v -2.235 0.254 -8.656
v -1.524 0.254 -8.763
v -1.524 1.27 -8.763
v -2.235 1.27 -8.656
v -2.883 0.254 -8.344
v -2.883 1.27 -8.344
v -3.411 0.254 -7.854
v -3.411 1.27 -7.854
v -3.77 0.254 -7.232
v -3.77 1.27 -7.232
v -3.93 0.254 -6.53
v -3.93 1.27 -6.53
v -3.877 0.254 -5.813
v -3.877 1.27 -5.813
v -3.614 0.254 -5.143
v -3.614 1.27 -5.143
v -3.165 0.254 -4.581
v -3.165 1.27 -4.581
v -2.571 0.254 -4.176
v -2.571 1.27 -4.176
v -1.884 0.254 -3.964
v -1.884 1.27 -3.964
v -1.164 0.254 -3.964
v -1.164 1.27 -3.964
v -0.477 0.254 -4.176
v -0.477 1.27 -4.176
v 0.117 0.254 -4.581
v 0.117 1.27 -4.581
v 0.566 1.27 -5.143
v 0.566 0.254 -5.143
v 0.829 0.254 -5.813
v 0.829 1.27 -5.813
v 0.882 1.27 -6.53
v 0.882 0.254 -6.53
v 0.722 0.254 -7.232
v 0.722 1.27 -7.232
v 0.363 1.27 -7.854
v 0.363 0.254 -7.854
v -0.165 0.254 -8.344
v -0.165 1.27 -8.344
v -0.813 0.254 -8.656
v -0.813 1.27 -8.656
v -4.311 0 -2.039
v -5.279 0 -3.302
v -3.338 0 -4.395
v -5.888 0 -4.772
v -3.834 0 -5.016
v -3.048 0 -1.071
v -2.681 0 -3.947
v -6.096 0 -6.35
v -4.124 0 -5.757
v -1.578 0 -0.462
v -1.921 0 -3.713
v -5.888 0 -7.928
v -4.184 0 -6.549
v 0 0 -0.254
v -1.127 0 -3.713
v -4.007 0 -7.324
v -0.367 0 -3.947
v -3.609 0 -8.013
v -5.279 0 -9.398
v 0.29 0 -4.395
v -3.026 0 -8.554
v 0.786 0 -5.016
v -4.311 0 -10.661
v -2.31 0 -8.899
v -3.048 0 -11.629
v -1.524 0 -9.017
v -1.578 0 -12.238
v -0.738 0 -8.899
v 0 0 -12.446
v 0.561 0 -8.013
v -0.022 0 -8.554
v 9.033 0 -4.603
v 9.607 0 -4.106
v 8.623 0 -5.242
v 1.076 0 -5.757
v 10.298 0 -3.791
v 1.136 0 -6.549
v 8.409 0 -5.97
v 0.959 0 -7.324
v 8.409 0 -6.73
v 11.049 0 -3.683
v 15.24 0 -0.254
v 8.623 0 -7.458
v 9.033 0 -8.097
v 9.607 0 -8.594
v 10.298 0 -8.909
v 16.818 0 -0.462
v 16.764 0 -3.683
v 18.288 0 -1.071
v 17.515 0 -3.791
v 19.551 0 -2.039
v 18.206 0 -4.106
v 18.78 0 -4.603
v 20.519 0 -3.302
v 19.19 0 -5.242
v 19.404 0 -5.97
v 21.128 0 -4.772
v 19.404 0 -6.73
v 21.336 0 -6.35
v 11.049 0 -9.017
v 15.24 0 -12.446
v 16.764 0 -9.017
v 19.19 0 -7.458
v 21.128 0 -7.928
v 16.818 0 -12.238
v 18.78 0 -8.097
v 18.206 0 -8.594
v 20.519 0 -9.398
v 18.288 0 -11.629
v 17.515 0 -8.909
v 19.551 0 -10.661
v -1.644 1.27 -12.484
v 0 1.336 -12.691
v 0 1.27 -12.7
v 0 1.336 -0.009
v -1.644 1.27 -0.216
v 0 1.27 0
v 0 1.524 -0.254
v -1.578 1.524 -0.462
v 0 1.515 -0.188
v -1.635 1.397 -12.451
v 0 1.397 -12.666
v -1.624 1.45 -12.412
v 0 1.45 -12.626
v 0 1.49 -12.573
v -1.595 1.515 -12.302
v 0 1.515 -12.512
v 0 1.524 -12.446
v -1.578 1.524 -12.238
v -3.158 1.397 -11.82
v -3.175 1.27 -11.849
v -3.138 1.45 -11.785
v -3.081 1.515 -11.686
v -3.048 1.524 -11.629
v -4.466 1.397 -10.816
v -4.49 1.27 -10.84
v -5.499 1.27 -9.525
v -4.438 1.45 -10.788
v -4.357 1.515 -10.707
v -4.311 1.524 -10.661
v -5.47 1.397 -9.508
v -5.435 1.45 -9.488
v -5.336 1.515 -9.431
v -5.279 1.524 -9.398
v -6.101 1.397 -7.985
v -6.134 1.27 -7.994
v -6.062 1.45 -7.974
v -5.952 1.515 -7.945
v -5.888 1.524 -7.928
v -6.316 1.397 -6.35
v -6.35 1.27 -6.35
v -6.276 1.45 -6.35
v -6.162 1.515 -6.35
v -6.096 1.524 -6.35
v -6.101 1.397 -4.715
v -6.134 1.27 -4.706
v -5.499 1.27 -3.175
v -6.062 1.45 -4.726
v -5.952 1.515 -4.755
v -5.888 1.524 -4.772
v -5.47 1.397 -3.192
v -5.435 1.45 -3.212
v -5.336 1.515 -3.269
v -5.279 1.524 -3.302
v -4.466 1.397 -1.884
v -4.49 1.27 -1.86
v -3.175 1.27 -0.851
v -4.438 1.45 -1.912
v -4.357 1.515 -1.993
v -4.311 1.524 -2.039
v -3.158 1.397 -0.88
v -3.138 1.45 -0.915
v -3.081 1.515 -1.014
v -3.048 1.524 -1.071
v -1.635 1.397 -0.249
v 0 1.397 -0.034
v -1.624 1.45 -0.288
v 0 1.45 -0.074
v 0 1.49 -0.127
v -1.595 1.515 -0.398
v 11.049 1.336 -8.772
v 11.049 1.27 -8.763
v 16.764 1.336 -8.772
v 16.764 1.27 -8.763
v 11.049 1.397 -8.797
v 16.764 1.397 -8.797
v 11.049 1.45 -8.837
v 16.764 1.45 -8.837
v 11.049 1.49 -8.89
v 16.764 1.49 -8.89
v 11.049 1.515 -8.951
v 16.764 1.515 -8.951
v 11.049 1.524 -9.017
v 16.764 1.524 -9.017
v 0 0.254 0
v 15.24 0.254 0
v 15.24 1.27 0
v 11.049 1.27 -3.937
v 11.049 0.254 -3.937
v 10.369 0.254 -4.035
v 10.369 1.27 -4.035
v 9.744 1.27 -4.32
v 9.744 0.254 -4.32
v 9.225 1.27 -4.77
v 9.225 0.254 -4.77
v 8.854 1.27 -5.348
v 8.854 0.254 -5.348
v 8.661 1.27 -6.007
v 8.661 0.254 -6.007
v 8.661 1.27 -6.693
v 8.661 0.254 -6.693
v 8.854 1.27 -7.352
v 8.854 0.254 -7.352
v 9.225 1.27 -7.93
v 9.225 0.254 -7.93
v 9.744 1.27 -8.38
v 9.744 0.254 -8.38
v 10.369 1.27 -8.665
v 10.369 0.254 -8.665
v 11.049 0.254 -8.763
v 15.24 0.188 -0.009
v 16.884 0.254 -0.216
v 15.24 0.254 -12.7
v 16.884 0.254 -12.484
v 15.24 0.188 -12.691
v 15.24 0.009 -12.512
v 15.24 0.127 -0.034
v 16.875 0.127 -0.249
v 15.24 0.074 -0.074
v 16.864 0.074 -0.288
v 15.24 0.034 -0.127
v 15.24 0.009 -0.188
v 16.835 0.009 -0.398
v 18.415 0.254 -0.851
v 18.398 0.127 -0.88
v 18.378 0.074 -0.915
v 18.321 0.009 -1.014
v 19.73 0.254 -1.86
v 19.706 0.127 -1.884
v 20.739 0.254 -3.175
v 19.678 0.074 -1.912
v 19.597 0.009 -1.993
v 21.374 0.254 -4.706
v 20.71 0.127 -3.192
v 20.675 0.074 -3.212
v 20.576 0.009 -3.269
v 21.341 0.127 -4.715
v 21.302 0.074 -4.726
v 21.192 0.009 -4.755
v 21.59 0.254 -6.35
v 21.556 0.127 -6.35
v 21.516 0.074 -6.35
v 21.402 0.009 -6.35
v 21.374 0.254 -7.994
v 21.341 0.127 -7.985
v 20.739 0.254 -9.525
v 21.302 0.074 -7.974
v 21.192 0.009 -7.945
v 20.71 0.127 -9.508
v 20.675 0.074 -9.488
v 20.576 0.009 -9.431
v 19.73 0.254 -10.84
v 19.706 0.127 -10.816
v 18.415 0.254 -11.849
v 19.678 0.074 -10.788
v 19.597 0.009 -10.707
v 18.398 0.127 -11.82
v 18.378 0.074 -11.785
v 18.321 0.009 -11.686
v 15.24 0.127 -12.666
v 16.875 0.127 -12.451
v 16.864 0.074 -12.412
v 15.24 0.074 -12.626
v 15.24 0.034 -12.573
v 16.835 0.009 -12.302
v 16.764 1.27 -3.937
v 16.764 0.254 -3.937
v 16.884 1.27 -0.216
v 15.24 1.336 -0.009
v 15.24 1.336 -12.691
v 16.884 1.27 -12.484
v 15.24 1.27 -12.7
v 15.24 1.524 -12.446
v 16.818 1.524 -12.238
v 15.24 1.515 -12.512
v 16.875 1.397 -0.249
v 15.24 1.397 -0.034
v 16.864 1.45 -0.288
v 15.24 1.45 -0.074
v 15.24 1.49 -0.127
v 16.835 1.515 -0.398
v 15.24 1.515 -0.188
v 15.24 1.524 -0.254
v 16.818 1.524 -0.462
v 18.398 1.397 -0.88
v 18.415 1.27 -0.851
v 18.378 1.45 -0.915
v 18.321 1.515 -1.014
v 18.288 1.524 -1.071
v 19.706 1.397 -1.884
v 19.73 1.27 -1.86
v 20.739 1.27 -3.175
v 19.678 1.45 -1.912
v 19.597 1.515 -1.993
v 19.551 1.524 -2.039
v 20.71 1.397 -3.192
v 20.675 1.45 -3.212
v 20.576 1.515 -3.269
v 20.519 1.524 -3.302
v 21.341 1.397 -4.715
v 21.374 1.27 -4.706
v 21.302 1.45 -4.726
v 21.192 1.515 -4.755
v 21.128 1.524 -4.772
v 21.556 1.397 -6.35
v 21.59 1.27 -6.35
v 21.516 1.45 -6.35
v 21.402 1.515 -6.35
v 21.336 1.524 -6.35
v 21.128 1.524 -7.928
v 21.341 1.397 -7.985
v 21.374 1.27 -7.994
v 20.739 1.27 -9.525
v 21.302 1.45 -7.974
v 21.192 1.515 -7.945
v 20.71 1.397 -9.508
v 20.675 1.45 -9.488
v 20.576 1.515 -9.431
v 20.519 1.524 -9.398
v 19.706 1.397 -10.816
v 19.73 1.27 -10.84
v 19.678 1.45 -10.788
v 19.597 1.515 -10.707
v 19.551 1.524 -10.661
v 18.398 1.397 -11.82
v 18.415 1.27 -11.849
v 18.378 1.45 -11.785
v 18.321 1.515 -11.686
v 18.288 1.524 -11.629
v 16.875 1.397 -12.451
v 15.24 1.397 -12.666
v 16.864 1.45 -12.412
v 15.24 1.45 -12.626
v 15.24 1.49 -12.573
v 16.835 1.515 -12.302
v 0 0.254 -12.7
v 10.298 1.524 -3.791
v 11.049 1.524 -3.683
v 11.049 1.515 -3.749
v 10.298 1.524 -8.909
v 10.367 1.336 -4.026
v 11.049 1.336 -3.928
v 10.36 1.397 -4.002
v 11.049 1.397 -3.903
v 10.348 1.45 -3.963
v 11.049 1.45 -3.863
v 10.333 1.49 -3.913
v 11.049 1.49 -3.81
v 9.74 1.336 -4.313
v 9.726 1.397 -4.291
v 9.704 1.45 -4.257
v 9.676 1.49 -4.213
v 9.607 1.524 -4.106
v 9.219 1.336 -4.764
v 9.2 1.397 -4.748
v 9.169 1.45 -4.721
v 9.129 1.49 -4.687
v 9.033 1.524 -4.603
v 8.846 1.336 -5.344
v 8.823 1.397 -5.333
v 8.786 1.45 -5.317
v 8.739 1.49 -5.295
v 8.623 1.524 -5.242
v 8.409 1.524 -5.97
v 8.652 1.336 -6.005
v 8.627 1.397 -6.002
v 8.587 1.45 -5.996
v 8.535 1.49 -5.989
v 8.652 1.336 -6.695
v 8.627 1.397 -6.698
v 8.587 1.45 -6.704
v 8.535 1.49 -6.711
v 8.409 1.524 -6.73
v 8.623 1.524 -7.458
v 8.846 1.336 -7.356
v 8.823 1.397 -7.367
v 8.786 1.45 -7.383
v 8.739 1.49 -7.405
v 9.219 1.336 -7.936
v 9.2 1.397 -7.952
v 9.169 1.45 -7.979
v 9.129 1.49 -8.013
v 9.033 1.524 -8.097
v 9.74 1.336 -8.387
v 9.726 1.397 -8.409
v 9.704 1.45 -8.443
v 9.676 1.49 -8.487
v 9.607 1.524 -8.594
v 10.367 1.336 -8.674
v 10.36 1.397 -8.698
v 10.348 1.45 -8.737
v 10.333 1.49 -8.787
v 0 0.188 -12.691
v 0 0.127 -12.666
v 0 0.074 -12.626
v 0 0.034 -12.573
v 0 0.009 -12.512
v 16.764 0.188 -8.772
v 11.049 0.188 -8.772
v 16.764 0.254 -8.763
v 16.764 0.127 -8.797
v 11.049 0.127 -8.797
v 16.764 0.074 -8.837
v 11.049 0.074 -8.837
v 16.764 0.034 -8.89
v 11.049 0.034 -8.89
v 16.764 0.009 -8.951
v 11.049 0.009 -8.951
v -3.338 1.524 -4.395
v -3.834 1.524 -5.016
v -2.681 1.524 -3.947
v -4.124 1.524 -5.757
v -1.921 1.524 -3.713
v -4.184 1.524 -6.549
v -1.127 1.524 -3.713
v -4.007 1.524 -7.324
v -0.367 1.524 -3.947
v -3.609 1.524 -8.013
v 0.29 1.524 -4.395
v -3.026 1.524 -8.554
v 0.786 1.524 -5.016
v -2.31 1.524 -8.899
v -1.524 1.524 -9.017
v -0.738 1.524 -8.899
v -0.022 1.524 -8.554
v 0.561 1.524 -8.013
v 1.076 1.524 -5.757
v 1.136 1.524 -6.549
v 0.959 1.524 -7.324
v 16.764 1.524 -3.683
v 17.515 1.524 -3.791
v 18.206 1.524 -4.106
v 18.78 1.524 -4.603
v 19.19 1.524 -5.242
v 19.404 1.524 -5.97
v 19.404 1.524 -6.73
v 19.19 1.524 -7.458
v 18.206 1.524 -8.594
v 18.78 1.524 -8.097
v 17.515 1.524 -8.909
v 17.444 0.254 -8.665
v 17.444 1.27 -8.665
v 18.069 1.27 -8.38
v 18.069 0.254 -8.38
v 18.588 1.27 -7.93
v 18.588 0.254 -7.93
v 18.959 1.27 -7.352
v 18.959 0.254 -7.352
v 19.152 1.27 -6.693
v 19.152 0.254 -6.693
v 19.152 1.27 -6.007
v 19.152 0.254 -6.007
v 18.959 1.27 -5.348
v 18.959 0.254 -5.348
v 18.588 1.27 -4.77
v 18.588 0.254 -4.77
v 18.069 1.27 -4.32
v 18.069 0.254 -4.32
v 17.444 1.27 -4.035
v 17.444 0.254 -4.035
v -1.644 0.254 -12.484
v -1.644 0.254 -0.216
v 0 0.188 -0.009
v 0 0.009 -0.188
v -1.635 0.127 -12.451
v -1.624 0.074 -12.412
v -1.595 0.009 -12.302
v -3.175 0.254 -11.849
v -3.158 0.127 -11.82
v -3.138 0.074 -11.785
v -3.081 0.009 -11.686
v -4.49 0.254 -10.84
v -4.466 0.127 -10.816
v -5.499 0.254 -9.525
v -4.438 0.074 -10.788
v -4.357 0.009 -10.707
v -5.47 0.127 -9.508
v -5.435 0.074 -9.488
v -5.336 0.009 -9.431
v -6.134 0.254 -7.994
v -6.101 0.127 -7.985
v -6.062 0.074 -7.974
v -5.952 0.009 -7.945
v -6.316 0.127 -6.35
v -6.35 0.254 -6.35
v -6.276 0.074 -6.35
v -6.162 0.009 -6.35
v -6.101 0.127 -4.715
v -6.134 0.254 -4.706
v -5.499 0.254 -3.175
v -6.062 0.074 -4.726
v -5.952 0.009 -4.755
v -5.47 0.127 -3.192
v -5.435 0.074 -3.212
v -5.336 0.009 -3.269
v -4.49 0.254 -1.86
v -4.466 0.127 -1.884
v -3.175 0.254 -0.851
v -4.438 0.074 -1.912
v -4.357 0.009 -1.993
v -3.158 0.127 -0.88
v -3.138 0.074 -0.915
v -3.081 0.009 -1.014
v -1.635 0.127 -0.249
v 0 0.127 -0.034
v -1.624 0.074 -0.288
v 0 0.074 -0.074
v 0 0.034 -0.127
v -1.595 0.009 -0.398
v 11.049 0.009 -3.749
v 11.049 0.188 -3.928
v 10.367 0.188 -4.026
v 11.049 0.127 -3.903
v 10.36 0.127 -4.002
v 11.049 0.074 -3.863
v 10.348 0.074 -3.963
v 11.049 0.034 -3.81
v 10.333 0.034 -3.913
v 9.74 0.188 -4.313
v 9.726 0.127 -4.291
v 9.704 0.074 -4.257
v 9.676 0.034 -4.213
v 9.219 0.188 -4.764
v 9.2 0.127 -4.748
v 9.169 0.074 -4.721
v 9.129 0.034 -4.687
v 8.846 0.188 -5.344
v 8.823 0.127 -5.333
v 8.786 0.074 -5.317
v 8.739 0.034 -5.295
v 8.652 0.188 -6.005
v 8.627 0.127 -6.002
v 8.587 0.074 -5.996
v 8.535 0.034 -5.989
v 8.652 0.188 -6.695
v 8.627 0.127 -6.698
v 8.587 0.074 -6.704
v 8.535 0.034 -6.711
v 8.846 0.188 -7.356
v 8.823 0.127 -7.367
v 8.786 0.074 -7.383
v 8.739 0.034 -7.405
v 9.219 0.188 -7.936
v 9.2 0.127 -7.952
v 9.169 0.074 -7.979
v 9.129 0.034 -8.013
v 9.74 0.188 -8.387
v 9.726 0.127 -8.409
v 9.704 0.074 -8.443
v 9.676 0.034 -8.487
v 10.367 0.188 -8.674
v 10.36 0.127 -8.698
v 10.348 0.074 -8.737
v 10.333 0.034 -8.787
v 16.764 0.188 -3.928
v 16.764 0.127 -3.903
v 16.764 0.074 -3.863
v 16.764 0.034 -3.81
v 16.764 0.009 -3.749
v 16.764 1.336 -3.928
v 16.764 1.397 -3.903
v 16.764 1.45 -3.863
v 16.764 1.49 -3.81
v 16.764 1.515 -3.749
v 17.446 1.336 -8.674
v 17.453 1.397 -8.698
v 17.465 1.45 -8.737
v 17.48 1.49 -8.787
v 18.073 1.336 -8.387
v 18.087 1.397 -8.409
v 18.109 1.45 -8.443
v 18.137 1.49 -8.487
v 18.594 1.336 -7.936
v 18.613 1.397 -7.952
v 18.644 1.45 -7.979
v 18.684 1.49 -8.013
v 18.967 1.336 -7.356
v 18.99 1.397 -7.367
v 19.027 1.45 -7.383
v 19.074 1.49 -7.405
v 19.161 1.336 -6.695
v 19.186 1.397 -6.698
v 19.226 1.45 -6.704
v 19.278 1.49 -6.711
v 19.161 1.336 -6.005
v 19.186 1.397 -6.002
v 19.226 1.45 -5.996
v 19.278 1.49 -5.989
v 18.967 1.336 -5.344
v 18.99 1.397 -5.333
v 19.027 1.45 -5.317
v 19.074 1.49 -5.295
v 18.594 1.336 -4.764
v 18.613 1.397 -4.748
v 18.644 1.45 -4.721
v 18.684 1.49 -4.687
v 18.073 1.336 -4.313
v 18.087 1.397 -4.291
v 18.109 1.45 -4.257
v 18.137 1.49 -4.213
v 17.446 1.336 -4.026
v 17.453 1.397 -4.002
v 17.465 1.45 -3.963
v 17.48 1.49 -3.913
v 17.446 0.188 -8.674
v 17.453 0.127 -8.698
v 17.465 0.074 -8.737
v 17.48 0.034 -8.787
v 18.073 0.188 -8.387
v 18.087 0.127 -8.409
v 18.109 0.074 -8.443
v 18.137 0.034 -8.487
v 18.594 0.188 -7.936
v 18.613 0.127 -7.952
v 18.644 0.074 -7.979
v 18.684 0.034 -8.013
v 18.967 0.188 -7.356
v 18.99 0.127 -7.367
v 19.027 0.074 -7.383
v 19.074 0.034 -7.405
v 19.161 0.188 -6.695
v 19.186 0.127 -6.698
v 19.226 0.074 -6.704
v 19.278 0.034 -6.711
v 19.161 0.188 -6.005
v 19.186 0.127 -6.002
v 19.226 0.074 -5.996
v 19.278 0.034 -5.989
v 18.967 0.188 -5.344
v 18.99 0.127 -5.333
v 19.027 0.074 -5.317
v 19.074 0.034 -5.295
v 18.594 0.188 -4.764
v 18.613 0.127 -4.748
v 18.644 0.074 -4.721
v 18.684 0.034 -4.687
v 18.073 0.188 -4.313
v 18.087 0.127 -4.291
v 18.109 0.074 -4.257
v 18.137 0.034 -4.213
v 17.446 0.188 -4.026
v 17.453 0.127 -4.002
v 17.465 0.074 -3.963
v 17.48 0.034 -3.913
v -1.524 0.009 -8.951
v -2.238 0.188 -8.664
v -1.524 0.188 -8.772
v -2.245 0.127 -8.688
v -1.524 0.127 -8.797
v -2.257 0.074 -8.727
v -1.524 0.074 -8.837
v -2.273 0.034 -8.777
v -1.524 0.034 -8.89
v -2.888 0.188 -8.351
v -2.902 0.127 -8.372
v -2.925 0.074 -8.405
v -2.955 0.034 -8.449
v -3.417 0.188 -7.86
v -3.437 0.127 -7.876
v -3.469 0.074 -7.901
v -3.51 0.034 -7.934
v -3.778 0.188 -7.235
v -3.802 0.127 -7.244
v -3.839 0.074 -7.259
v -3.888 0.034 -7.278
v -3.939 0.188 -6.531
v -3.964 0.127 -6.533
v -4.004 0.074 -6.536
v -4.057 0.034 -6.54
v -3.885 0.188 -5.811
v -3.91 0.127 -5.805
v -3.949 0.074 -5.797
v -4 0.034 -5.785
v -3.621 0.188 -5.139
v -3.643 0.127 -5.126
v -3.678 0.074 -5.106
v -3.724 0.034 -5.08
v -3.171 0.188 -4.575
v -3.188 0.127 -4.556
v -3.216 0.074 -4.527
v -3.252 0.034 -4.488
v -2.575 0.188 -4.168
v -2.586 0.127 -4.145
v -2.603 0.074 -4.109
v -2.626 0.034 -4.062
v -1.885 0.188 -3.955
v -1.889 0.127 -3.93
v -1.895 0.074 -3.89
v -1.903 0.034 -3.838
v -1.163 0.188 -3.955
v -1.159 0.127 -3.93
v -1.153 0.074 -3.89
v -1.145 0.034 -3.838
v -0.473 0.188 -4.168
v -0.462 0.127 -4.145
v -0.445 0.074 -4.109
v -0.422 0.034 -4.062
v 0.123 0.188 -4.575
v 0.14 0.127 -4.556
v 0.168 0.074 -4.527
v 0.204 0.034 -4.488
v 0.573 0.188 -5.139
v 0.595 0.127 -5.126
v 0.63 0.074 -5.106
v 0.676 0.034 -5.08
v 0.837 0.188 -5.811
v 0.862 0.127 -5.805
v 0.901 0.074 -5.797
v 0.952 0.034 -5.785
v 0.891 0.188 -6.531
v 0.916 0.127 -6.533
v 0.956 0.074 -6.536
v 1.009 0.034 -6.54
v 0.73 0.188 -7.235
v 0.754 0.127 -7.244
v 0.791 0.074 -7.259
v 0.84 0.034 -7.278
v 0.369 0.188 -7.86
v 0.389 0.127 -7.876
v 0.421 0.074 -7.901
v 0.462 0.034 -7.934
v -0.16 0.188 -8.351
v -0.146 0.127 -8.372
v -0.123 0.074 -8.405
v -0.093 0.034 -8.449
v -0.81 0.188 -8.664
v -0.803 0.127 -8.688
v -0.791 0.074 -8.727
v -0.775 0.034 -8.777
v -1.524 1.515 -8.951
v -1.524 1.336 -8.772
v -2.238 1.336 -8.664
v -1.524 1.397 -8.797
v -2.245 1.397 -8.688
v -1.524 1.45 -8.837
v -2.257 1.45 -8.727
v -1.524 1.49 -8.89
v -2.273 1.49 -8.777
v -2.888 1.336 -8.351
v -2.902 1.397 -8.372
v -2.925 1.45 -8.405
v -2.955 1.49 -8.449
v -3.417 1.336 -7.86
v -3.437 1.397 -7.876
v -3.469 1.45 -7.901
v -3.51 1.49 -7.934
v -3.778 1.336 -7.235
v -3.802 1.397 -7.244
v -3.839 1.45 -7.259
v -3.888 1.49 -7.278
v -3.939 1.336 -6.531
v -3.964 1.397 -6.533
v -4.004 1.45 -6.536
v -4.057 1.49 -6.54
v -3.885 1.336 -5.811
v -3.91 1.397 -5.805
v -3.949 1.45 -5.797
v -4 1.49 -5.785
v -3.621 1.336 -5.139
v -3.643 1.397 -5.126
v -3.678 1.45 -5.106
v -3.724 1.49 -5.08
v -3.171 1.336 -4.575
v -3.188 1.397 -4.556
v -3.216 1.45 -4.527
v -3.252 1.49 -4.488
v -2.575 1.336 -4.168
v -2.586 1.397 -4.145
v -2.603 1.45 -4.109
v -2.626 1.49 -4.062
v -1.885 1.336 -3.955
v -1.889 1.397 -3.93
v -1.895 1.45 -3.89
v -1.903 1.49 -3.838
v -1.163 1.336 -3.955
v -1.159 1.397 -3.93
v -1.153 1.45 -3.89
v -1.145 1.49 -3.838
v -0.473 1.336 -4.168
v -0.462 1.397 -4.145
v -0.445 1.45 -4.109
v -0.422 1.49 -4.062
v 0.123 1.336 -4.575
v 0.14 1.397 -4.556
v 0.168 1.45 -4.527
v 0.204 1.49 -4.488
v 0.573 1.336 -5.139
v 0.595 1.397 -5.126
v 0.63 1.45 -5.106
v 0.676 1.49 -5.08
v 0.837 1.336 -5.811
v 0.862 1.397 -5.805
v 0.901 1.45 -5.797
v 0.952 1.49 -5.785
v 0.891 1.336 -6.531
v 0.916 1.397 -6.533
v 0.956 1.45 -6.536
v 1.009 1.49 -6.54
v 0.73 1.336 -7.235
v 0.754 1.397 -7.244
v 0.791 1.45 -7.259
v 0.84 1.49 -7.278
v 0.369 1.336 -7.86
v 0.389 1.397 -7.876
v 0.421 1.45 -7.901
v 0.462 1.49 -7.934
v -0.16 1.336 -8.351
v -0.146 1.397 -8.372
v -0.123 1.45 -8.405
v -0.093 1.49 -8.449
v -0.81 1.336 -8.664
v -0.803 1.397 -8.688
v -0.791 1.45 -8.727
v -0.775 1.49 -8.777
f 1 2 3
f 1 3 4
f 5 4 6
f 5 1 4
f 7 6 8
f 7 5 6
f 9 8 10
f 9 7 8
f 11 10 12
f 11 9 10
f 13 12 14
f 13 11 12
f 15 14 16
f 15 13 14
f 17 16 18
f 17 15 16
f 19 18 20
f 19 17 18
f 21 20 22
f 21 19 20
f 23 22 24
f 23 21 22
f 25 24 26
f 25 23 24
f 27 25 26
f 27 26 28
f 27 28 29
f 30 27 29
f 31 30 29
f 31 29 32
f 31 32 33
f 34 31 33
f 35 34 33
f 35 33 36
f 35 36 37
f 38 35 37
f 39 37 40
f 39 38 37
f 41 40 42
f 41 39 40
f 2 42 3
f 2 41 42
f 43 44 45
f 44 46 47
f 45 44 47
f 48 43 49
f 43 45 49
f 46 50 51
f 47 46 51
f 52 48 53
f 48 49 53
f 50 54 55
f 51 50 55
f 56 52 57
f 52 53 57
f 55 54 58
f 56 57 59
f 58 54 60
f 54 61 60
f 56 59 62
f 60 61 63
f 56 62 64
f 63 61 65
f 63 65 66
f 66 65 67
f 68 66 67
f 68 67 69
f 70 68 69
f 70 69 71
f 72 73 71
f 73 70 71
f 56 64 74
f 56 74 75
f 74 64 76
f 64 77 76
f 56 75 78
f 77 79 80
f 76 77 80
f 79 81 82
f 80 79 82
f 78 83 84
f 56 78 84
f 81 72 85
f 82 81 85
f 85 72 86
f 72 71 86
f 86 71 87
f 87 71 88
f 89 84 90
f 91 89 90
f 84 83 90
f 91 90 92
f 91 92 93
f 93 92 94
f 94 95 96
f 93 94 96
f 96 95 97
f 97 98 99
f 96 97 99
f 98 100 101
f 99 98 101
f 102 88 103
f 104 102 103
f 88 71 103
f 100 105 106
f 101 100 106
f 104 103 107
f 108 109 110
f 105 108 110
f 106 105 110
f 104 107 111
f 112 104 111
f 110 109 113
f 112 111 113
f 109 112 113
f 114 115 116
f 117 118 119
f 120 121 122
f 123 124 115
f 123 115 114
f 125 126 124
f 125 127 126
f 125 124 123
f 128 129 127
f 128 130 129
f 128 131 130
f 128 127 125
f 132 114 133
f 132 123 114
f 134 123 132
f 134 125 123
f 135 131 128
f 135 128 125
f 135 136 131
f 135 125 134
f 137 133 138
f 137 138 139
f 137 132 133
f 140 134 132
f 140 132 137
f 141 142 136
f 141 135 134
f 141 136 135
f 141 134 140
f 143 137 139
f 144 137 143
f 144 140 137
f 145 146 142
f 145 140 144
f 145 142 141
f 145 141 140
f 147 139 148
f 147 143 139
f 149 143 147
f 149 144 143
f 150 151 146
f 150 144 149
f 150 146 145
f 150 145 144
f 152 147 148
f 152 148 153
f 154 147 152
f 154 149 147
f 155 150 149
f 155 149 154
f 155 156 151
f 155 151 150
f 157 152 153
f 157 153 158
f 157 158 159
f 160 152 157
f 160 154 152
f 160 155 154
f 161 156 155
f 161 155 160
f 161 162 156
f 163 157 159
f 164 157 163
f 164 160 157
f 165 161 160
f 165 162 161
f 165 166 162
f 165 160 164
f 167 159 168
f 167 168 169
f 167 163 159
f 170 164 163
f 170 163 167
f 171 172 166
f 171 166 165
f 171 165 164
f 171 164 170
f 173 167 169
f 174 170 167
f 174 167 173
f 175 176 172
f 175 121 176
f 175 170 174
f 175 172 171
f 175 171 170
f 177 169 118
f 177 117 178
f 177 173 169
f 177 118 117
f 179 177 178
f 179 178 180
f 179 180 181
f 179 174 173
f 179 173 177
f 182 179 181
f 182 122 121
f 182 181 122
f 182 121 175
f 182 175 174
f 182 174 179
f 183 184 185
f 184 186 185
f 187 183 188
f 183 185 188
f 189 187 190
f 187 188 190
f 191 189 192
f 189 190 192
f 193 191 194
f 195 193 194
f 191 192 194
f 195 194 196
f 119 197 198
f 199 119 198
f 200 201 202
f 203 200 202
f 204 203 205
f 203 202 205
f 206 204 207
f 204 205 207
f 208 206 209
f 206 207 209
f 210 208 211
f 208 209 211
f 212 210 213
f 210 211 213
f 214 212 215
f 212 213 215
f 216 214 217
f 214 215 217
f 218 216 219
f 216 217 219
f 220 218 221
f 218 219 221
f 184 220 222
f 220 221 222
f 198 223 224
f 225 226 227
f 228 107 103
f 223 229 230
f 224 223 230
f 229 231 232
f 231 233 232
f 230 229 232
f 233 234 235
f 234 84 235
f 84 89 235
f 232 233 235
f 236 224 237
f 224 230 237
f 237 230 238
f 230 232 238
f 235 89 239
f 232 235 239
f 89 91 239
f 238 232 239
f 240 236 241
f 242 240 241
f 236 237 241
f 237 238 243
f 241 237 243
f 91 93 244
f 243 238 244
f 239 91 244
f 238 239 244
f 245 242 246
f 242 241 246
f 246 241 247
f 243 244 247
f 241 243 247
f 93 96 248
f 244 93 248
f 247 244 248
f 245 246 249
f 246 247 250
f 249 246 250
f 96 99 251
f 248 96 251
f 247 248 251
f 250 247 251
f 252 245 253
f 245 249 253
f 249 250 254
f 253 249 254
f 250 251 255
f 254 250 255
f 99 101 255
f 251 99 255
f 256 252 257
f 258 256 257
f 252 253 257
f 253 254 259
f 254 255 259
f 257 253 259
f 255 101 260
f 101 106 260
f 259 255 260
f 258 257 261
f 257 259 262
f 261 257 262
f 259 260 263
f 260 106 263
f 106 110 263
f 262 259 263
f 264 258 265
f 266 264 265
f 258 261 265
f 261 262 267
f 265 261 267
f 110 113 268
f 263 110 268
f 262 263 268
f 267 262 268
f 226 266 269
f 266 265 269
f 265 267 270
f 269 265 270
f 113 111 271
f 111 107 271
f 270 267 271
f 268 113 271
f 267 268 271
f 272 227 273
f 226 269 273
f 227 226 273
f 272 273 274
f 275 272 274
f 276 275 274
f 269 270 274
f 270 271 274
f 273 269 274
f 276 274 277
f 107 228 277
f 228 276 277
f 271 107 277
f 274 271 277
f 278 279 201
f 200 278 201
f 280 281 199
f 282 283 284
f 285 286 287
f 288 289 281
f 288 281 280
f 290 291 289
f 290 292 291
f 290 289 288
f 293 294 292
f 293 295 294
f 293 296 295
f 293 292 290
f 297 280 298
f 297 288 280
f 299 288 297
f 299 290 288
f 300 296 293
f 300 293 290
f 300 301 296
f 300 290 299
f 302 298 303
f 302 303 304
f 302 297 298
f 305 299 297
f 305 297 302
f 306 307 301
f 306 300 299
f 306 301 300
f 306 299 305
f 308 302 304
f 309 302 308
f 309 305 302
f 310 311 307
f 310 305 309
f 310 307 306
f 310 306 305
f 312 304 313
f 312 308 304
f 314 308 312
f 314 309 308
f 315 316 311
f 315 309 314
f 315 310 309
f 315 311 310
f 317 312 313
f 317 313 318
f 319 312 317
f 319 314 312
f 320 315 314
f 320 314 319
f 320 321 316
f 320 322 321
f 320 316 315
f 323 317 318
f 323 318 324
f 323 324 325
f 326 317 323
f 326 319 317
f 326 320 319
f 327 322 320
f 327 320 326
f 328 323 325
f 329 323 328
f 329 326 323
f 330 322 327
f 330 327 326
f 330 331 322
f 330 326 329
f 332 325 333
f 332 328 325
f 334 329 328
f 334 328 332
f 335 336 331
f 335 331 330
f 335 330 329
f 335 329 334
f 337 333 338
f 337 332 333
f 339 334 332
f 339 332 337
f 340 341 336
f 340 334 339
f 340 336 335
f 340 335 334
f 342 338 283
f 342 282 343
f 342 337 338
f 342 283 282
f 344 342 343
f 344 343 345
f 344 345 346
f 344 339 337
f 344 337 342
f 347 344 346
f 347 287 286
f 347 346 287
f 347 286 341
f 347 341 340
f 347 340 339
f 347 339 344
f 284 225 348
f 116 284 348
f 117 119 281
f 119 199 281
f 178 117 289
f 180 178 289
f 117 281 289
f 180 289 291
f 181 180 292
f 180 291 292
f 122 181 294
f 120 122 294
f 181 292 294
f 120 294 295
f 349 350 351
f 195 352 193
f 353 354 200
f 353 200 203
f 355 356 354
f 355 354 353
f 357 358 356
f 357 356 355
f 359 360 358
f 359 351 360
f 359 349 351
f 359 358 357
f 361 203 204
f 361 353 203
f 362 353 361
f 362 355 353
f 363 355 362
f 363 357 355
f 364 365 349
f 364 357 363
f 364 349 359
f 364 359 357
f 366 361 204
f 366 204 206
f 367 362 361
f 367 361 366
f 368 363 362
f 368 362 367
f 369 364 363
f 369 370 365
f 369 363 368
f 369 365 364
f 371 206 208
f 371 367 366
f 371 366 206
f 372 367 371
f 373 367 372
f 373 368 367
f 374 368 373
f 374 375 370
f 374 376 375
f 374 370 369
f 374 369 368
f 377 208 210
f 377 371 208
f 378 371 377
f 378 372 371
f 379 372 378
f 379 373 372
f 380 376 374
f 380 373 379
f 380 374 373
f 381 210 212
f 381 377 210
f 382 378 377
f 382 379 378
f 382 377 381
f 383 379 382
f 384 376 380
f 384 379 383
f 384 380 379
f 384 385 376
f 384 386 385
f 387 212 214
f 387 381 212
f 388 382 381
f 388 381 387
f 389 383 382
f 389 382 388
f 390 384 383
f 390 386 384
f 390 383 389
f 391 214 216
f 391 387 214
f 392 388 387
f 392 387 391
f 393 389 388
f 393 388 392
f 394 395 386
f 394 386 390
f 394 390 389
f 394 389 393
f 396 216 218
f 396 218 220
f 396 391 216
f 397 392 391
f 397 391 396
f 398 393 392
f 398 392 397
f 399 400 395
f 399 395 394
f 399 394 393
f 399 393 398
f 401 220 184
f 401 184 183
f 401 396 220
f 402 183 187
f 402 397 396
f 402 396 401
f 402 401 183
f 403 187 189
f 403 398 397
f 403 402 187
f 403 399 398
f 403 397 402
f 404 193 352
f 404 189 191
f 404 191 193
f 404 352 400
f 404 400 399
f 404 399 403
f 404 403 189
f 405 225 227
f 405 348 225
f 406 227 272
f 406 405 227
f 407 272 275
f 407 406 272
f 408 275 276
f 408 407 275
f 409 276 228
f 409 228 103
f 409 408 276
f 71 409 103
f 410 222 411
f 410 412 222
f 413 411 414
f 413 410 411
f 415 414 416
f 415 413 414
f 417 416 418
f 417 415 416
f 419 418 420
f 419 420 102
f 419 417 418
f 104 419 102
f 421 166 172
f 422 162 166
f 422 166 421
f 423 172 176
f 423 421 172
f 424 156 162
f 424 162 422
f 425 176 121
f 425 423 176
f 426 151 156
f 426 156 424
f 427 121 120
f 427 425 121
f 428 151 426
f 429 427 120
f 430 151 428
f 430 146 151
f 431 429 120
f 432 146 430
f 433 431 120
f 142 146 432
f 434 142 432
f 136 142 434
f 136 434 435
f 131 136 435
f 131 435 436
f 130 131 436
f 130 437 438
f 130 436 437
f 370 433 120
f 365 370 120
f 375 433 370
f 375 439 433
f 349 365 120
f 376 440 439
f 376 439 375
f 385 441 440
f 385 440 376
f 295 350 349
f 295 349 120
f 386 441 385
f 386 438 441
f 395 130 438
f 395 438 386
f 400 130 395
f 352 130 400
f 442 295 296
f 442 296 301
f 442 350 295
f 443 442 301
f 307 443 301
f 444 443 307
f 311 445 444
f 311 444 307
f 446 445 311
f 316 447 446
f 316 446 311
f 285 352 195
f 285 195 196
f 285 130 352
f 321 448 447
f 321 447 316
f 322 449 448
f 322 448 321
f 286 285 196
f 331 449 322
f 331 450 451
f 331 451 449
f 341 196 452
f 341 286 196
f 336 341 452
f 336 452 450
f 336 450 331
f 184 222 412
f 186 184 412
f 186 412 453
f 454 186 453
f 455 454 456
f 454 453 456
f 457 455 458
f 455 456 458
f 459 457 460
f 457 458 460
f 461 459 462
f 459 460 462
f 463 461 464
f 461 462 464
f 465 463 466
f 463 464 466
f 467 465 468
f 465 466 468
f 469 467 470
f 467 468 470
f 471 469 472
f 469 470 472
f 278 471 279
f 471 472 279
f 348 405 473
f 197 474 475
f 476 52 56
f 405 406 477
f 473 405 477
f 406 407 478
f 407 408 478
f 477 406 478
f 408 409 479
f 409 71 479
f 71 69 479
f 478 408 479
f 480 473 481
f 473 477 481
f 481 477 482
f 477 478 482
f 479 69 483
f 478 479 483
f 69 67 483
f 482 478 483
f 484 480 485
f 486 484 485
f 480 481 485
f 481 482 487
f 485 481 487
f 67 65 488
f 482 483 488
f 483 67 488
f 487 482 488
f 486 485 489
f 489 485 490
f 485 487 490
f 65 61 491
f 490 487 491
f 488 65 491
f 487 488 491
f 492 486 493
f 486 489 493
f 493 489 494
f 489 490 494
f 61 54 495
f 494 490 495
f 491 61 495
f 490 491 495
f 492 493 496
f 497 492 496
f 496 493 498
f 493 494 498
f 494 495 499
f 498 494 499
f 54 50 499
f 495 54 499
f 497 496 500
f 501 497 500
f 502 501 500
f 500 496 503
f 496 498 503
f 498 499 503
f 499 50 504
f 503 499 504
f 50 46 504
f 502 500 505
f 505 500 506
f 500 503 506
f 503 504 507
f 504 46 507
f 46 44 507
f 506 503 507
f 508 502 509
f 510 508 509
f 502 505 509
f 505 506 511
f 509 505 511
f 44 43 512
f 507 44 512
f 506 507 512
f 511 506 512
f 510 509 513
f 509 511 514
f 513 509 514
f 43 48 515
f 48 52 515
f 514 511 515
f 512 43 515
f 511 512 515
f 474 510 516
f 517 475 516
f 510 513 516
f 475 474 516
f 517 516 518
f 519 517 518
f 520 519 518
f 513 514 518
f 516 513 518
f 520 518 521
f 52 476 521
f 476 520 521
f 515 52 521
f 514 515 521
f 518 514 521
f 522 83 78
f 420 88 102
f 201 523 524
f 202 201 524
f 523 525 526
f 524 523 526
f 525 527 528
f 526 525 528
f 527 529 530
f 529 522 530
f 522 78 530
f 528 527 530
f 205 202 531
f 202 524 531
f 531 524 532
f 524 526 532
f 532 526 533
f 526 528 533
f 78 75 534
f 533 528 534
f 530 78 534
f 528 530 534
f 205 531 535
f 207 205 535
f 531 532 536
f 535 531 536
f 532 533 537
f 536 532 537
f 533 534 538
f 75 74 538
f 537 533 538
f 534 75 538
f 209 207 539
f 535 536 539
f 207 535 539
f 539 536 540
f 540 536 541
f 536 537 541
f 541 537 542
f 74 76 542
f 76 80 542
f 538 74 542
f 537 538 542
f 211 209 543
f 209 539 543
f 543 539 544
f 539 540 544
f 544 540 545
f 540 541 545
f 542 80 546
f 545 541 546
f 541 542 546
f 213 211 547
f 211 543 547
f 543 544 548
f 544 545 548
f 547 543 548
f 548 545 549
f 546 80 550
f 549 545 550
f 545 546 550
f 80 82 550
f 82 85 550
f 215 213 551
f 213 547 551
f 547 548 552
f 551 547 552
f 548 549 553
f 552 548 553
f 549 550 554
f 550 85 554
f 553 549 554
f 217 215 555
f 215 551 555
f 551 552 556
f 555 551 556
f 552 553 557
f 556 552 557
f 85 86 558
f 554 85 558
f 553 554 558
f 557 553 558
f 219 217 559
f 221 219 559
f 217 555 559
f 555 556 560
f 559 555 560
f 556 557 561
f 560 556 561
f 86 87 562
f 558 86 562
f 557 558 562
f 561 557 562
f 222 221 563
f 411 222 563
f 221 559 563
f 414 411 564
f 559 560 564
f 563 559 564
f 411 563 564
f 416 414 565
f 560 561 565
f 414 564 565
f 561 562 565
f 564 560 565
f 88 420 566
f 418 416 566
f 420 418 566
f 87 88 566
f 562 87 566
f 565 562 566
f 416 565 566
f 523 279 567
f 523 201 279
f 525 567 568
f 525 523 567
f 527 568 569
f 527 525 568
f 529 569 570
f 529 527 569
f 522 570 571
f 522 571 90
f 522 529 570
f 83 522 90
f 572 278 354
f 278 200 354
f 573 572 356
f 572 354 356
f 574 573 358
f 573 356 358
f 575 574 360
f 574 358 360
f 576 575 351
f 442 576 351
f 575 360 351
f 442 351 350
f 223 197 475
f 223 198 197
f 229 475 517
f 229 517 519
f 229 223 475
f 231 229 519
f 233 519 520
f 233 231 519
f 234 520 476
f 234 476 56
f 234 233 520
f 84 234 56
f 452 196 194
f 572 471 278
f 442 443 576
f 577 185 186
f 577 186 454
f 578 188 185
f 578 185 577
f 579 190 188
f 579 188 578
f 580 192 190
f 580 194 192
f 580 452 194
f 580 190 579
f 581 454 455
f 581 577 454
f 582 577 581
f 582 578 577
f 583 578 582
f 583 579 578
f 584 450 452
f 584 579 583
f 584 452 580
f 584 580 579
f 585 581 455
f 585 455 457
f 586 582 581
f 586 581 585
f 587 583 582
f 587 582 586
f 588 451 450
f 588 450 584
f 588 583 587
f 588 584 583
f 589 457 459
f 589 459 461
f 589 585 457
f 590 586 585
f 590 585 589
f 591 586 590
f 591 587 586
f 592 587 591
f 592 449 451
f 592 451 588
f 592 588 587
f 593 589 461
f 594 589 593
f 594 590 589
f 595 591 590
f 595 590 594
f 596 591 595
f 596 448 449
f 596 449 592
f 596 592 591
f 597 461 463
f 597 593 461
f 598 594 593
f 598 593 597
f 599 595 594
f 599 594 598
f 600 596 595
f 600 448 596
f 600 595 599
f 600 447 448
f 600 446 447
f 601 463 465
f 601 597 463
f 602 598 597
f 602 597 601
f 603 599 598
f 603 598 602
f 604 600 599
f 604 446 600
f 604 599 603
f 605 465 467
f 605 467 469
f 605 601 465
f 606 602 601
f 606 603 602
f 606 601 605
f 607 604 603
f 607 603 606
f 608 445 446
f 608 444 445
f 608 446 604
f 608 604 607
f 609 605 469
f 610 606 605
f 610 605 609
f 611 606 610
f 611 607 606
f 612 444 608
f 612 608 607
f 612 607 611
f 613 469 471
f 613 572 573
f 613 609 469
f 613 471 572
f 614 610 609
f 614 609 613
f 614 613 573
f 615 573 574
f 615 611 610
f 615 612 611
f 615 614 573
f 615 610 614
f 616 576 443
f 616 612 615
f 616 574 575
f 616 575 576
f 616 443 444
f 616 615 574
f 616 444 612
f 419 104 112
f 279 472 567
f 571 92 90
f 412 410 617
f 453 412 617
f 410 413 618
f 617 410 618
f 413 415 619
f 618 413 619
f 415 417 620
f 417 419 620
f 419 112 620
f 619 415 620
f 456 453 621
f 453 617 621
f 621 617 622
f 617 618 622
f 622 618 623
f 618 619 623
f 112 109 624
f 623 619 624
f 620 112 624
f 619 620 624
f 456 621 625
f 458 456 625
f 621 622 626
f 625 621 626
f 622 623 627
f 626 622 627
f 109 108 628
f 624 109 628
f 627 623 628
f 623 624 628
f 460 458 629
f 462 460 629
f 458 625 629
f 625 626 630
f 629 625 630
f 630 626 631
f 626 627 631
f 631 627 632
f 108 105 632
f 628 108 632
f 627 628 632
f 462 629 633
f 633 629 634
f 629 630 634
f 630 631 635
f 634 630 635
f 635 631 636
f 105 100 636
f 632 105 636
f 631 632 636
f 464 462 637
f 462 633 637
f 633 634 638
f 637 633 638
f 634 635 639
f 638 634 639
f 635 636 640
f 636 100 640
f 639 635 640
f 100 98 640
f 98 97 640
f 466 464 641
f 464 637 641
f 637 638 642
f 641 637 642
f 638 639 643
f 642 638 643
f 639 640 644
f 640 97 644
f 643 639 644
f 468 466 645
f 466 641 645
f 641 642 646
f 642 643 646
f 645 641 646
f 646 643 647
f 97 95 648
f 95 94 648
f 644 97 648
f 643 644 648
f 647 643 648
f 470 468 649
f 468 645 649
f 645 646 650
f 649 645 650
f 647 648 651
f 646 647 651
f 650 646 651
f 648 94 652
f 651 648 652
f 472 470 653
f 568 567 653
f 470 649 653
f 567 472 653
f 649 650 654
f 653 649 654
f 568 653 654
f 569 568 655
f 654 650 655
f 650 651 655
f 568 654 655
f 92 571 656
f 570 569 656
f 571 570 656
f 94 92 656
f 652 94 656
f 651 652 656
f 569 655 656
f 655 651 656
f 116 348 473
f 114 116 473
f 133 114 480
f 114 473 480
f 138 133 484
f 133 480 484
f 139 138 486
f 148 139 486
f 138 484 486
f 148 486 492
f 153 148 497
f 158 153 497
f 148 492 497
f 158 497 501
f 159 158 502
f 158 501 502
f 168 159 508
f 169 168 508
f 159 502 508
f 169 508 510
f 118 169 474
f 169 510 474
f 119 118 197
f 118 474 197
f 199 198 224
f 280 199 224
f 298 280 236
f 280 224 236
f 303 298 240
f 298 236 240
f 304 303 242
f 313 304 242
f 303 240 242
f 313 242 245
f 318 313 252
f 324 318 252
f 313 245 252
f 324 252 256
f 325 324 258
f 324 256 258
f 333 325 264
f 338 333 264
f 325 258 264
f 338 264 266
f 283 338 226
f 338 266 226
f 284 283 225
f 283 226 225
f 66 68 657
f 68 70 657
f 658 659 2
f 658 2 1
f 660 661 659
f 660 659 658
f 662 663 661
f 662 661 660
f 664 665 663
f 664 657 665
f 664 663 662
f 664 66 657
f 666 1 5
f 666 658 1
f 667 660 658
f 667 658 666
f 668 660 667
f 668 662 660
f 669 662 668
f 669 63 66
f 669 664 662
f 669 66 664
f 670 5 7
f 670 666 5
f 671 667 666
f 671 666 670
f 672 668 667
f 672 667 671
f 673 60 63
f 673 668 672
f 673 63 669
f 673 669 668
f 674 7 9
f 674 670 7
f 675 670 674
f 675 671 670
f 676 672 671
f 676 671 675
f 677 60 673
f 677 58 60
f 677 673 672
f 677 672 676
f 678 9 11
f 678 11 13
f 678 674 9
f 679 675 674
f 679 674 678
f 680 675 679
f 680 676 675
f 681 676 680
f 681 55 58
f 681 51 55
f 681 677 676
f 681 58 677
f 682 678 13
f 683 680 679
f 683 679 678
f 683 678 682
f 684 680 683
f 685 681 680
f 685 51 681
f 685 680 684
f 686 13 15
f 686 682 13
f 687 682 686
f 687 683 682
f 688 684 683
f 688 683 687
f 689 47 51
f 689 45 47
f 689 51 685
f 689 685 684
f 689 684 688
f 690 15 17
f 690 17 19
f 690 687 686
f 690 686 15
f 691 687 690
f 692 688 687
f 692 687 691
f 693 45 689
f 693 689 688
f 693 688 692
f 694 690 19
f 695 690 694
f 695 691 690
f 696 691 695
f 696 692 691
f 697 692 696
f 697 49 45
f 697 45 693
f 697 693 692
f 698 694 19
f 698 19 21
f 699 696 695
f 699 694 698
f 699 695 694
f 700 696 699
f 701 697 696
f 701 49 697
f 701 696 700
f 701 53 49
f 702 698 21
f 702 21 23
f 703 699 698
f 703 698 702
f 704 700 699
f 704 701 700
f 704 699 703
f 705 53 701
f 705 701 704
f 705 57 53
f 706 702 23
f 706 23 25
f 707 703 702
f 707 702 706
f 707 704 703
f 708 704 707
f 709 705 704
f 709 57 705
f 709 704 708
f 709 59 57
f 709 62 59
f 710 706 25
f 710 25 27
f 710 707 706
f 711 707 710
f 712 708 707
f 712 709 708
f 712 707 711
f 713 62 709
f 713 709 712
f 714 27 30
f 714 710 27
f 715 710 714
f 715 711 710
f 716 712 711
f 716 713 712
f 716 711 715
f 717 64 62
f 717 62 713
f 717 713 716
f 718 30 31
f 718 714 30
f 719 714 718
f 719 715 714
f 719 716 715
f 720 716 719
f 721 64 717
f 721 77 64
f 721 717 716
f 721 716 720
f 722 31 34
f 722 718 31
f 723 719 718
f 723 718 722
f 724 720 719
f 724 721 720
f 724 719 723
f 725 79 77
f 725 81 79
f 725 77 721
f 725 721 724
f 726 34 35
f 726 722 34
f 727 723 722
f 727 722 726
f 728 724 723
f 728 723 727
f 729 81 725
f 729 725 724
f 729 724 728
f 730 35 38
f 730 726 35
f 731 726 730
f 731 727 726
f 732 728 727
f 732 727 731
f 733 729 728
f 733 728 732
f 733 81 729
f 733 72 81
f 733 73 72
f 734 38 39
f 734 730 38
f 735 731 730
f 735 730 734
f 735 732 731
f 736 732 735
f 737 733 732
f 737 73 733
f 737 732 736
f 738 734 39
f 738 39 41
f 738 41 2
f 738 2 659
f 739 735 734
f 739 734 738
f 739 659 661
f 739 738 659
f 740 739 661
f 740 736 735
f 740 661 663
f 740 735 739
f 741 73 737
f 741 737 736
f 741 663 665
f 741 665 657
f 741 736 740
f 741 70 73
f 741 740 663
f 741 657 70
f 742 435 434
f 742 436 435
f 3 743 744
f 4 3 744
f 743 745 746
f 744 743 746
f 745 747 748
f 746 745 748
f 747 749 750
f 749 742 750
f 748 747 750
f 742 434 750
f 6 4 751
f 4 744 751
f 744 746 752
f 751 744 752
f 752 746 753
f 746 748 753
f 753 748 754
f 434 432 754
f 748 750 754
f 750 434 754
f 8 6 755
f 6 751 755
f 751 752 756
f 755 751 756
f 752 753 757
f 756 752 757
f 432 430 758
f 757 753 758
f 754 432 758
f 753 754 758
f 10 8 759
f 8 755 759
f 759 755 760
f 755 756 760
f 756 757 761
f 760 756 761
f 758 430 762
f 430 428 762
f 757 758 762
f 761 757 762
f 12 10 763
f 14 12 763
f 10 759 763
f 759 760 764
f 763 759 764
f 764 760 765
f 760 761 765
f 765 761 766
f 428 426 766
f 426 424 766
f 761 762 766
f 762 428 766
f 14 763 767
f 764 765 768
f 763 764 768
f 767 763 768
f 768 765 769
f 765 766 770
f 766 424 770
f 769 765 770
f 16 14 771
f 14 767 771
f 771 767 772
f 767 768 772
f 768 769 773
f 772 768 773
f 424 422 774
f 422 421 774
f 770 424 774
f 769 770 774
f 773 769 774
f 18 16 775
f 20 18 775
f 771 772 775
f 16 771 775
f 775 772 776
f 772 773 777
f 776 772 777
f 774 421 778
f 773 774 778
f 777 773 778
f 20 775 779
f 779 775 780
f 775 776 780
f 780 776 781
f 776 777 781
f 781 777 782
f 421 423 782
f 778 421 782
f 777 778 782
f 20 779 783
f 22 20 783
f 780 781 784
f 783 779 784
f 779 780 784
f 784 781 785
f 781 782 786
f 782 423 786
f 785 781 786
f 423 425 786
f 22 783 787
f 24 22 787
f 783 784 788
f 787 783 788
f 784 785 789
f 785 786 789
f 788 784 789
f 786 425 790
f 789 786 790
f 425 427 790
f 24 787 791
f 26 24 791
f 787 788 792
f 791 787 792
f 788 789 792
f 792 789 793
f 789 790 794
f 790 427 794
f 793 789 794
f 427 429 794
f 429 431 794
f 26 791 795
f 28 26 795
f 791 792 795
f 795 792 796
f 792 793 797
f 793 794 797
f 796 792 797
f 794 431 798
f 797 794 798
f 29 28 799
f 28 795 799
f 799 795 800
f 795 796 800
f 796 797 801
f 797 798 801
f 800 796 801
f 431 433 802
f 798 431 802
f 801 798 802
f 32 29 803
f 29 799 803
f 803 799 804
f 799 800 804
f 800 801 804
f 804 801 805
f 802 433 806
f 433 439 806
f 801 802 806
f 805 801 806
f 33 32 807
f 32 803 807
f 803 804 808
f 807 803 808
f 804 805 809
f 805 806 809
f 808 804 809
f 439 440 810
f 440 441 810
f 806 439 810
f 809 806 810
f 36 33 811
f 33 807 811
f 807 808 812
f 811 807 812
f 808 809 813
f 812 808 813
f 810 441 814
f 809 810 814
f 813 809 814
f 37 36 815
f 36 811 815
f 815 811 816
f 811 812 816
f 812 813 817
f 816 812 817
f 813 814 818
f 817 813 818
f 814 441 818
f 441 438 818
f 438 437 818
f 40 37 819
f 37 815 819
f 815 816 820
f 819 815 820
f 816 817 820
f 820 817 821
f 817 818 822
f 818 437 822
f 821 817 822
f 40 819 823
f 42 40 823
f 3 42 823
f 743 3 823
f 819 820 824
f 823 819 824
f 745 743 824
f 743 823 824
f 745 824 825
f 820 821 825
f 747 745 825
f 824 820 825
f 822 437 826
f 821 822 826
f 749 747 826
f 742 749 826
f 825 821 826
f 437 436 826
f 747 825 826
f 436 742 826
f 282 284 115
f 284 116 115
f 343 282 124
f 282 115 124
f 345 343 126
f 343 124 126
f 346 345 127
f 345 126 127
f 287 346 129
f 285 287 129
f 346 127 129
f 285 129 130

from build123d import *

# Parameters (mm, degrees)
SKETCH1_R          = 2.413
BASE_FLANGE1_DEPTH = 1.524
FILLET2_R          = 0.254


# Sheet-metal steps are written as plain solids
with BuildPart() as part:
    # Sketch1 → Base-Flange1 (new body)
    with BuildSketch(Plane(origin=(0, 0, 0), x_dir=(1, 0, 0), z_dir=(0, 1, 0))):
        with BuildLine():
            Line((0, 0), (15.24, 0))
            ThreePointArc((15.24, 0), (21.59, 6.35), (15.24, 12.7))
            Line((15.24, 12.7), (0, 12.7))
            ThreePointArc((0, 12.7), (-6.35, 6.35), (0, 0))
        make_face()
        with Locations(Location((-1.524, 6.35, 0), (0, 0, 90))):
            Circle(SKETCH1_R, mode=Mode.SUBTRACT)
        with BuildLine():
            Line((11.049, 8.763), (16.764, 8.763))
            ThreePointArc((16.764, 8.763), (19.177, 6.35), (16.764, 3.937))
            Line((16.764, 3.937), (11.049, 3.937))
            ThreePointArc((11.049, 3.937), (8.636, 6.35), (11.049, 8.763))
        make_face(mode=Mode.SUBTRACT)
    extrude(amount=BASE_FLANGE1_DEPTH)

    # Fillet2
    fillet2_edges = [part.edges().sort_by_distance(p)[0] for p in [
        (21.59, 1.524, -6.35),
        (-1.524, 0, -3.937),
        (-1.524, 1.524, -3.937),
        (7.62, 1.524, -12.7),
        (8.636, 0, -6.35),
        (13.9065, 0, -3.937),
        (19.177, 0, -6.35),
        (13.9065, 0, -8.763),
        (8.636, 1.524, -6.35),
        (13.9065, 1.524, -3.937),
        (19.177, 1.524, -6.35),
        (13.9065, 1.524, -8.763),
        (-6.35, 1.524, -6.35),
        (7.62, 0, -12.7),
        (21.59, 0, -6.35),
        (7.62, 0, 0),
        (-6.35, 0, -6.35),
        (7.62, 1.524, 0),
    ]]
    fillet(fillet2_edges, radius=FILLET2_R)


solid = part.part
